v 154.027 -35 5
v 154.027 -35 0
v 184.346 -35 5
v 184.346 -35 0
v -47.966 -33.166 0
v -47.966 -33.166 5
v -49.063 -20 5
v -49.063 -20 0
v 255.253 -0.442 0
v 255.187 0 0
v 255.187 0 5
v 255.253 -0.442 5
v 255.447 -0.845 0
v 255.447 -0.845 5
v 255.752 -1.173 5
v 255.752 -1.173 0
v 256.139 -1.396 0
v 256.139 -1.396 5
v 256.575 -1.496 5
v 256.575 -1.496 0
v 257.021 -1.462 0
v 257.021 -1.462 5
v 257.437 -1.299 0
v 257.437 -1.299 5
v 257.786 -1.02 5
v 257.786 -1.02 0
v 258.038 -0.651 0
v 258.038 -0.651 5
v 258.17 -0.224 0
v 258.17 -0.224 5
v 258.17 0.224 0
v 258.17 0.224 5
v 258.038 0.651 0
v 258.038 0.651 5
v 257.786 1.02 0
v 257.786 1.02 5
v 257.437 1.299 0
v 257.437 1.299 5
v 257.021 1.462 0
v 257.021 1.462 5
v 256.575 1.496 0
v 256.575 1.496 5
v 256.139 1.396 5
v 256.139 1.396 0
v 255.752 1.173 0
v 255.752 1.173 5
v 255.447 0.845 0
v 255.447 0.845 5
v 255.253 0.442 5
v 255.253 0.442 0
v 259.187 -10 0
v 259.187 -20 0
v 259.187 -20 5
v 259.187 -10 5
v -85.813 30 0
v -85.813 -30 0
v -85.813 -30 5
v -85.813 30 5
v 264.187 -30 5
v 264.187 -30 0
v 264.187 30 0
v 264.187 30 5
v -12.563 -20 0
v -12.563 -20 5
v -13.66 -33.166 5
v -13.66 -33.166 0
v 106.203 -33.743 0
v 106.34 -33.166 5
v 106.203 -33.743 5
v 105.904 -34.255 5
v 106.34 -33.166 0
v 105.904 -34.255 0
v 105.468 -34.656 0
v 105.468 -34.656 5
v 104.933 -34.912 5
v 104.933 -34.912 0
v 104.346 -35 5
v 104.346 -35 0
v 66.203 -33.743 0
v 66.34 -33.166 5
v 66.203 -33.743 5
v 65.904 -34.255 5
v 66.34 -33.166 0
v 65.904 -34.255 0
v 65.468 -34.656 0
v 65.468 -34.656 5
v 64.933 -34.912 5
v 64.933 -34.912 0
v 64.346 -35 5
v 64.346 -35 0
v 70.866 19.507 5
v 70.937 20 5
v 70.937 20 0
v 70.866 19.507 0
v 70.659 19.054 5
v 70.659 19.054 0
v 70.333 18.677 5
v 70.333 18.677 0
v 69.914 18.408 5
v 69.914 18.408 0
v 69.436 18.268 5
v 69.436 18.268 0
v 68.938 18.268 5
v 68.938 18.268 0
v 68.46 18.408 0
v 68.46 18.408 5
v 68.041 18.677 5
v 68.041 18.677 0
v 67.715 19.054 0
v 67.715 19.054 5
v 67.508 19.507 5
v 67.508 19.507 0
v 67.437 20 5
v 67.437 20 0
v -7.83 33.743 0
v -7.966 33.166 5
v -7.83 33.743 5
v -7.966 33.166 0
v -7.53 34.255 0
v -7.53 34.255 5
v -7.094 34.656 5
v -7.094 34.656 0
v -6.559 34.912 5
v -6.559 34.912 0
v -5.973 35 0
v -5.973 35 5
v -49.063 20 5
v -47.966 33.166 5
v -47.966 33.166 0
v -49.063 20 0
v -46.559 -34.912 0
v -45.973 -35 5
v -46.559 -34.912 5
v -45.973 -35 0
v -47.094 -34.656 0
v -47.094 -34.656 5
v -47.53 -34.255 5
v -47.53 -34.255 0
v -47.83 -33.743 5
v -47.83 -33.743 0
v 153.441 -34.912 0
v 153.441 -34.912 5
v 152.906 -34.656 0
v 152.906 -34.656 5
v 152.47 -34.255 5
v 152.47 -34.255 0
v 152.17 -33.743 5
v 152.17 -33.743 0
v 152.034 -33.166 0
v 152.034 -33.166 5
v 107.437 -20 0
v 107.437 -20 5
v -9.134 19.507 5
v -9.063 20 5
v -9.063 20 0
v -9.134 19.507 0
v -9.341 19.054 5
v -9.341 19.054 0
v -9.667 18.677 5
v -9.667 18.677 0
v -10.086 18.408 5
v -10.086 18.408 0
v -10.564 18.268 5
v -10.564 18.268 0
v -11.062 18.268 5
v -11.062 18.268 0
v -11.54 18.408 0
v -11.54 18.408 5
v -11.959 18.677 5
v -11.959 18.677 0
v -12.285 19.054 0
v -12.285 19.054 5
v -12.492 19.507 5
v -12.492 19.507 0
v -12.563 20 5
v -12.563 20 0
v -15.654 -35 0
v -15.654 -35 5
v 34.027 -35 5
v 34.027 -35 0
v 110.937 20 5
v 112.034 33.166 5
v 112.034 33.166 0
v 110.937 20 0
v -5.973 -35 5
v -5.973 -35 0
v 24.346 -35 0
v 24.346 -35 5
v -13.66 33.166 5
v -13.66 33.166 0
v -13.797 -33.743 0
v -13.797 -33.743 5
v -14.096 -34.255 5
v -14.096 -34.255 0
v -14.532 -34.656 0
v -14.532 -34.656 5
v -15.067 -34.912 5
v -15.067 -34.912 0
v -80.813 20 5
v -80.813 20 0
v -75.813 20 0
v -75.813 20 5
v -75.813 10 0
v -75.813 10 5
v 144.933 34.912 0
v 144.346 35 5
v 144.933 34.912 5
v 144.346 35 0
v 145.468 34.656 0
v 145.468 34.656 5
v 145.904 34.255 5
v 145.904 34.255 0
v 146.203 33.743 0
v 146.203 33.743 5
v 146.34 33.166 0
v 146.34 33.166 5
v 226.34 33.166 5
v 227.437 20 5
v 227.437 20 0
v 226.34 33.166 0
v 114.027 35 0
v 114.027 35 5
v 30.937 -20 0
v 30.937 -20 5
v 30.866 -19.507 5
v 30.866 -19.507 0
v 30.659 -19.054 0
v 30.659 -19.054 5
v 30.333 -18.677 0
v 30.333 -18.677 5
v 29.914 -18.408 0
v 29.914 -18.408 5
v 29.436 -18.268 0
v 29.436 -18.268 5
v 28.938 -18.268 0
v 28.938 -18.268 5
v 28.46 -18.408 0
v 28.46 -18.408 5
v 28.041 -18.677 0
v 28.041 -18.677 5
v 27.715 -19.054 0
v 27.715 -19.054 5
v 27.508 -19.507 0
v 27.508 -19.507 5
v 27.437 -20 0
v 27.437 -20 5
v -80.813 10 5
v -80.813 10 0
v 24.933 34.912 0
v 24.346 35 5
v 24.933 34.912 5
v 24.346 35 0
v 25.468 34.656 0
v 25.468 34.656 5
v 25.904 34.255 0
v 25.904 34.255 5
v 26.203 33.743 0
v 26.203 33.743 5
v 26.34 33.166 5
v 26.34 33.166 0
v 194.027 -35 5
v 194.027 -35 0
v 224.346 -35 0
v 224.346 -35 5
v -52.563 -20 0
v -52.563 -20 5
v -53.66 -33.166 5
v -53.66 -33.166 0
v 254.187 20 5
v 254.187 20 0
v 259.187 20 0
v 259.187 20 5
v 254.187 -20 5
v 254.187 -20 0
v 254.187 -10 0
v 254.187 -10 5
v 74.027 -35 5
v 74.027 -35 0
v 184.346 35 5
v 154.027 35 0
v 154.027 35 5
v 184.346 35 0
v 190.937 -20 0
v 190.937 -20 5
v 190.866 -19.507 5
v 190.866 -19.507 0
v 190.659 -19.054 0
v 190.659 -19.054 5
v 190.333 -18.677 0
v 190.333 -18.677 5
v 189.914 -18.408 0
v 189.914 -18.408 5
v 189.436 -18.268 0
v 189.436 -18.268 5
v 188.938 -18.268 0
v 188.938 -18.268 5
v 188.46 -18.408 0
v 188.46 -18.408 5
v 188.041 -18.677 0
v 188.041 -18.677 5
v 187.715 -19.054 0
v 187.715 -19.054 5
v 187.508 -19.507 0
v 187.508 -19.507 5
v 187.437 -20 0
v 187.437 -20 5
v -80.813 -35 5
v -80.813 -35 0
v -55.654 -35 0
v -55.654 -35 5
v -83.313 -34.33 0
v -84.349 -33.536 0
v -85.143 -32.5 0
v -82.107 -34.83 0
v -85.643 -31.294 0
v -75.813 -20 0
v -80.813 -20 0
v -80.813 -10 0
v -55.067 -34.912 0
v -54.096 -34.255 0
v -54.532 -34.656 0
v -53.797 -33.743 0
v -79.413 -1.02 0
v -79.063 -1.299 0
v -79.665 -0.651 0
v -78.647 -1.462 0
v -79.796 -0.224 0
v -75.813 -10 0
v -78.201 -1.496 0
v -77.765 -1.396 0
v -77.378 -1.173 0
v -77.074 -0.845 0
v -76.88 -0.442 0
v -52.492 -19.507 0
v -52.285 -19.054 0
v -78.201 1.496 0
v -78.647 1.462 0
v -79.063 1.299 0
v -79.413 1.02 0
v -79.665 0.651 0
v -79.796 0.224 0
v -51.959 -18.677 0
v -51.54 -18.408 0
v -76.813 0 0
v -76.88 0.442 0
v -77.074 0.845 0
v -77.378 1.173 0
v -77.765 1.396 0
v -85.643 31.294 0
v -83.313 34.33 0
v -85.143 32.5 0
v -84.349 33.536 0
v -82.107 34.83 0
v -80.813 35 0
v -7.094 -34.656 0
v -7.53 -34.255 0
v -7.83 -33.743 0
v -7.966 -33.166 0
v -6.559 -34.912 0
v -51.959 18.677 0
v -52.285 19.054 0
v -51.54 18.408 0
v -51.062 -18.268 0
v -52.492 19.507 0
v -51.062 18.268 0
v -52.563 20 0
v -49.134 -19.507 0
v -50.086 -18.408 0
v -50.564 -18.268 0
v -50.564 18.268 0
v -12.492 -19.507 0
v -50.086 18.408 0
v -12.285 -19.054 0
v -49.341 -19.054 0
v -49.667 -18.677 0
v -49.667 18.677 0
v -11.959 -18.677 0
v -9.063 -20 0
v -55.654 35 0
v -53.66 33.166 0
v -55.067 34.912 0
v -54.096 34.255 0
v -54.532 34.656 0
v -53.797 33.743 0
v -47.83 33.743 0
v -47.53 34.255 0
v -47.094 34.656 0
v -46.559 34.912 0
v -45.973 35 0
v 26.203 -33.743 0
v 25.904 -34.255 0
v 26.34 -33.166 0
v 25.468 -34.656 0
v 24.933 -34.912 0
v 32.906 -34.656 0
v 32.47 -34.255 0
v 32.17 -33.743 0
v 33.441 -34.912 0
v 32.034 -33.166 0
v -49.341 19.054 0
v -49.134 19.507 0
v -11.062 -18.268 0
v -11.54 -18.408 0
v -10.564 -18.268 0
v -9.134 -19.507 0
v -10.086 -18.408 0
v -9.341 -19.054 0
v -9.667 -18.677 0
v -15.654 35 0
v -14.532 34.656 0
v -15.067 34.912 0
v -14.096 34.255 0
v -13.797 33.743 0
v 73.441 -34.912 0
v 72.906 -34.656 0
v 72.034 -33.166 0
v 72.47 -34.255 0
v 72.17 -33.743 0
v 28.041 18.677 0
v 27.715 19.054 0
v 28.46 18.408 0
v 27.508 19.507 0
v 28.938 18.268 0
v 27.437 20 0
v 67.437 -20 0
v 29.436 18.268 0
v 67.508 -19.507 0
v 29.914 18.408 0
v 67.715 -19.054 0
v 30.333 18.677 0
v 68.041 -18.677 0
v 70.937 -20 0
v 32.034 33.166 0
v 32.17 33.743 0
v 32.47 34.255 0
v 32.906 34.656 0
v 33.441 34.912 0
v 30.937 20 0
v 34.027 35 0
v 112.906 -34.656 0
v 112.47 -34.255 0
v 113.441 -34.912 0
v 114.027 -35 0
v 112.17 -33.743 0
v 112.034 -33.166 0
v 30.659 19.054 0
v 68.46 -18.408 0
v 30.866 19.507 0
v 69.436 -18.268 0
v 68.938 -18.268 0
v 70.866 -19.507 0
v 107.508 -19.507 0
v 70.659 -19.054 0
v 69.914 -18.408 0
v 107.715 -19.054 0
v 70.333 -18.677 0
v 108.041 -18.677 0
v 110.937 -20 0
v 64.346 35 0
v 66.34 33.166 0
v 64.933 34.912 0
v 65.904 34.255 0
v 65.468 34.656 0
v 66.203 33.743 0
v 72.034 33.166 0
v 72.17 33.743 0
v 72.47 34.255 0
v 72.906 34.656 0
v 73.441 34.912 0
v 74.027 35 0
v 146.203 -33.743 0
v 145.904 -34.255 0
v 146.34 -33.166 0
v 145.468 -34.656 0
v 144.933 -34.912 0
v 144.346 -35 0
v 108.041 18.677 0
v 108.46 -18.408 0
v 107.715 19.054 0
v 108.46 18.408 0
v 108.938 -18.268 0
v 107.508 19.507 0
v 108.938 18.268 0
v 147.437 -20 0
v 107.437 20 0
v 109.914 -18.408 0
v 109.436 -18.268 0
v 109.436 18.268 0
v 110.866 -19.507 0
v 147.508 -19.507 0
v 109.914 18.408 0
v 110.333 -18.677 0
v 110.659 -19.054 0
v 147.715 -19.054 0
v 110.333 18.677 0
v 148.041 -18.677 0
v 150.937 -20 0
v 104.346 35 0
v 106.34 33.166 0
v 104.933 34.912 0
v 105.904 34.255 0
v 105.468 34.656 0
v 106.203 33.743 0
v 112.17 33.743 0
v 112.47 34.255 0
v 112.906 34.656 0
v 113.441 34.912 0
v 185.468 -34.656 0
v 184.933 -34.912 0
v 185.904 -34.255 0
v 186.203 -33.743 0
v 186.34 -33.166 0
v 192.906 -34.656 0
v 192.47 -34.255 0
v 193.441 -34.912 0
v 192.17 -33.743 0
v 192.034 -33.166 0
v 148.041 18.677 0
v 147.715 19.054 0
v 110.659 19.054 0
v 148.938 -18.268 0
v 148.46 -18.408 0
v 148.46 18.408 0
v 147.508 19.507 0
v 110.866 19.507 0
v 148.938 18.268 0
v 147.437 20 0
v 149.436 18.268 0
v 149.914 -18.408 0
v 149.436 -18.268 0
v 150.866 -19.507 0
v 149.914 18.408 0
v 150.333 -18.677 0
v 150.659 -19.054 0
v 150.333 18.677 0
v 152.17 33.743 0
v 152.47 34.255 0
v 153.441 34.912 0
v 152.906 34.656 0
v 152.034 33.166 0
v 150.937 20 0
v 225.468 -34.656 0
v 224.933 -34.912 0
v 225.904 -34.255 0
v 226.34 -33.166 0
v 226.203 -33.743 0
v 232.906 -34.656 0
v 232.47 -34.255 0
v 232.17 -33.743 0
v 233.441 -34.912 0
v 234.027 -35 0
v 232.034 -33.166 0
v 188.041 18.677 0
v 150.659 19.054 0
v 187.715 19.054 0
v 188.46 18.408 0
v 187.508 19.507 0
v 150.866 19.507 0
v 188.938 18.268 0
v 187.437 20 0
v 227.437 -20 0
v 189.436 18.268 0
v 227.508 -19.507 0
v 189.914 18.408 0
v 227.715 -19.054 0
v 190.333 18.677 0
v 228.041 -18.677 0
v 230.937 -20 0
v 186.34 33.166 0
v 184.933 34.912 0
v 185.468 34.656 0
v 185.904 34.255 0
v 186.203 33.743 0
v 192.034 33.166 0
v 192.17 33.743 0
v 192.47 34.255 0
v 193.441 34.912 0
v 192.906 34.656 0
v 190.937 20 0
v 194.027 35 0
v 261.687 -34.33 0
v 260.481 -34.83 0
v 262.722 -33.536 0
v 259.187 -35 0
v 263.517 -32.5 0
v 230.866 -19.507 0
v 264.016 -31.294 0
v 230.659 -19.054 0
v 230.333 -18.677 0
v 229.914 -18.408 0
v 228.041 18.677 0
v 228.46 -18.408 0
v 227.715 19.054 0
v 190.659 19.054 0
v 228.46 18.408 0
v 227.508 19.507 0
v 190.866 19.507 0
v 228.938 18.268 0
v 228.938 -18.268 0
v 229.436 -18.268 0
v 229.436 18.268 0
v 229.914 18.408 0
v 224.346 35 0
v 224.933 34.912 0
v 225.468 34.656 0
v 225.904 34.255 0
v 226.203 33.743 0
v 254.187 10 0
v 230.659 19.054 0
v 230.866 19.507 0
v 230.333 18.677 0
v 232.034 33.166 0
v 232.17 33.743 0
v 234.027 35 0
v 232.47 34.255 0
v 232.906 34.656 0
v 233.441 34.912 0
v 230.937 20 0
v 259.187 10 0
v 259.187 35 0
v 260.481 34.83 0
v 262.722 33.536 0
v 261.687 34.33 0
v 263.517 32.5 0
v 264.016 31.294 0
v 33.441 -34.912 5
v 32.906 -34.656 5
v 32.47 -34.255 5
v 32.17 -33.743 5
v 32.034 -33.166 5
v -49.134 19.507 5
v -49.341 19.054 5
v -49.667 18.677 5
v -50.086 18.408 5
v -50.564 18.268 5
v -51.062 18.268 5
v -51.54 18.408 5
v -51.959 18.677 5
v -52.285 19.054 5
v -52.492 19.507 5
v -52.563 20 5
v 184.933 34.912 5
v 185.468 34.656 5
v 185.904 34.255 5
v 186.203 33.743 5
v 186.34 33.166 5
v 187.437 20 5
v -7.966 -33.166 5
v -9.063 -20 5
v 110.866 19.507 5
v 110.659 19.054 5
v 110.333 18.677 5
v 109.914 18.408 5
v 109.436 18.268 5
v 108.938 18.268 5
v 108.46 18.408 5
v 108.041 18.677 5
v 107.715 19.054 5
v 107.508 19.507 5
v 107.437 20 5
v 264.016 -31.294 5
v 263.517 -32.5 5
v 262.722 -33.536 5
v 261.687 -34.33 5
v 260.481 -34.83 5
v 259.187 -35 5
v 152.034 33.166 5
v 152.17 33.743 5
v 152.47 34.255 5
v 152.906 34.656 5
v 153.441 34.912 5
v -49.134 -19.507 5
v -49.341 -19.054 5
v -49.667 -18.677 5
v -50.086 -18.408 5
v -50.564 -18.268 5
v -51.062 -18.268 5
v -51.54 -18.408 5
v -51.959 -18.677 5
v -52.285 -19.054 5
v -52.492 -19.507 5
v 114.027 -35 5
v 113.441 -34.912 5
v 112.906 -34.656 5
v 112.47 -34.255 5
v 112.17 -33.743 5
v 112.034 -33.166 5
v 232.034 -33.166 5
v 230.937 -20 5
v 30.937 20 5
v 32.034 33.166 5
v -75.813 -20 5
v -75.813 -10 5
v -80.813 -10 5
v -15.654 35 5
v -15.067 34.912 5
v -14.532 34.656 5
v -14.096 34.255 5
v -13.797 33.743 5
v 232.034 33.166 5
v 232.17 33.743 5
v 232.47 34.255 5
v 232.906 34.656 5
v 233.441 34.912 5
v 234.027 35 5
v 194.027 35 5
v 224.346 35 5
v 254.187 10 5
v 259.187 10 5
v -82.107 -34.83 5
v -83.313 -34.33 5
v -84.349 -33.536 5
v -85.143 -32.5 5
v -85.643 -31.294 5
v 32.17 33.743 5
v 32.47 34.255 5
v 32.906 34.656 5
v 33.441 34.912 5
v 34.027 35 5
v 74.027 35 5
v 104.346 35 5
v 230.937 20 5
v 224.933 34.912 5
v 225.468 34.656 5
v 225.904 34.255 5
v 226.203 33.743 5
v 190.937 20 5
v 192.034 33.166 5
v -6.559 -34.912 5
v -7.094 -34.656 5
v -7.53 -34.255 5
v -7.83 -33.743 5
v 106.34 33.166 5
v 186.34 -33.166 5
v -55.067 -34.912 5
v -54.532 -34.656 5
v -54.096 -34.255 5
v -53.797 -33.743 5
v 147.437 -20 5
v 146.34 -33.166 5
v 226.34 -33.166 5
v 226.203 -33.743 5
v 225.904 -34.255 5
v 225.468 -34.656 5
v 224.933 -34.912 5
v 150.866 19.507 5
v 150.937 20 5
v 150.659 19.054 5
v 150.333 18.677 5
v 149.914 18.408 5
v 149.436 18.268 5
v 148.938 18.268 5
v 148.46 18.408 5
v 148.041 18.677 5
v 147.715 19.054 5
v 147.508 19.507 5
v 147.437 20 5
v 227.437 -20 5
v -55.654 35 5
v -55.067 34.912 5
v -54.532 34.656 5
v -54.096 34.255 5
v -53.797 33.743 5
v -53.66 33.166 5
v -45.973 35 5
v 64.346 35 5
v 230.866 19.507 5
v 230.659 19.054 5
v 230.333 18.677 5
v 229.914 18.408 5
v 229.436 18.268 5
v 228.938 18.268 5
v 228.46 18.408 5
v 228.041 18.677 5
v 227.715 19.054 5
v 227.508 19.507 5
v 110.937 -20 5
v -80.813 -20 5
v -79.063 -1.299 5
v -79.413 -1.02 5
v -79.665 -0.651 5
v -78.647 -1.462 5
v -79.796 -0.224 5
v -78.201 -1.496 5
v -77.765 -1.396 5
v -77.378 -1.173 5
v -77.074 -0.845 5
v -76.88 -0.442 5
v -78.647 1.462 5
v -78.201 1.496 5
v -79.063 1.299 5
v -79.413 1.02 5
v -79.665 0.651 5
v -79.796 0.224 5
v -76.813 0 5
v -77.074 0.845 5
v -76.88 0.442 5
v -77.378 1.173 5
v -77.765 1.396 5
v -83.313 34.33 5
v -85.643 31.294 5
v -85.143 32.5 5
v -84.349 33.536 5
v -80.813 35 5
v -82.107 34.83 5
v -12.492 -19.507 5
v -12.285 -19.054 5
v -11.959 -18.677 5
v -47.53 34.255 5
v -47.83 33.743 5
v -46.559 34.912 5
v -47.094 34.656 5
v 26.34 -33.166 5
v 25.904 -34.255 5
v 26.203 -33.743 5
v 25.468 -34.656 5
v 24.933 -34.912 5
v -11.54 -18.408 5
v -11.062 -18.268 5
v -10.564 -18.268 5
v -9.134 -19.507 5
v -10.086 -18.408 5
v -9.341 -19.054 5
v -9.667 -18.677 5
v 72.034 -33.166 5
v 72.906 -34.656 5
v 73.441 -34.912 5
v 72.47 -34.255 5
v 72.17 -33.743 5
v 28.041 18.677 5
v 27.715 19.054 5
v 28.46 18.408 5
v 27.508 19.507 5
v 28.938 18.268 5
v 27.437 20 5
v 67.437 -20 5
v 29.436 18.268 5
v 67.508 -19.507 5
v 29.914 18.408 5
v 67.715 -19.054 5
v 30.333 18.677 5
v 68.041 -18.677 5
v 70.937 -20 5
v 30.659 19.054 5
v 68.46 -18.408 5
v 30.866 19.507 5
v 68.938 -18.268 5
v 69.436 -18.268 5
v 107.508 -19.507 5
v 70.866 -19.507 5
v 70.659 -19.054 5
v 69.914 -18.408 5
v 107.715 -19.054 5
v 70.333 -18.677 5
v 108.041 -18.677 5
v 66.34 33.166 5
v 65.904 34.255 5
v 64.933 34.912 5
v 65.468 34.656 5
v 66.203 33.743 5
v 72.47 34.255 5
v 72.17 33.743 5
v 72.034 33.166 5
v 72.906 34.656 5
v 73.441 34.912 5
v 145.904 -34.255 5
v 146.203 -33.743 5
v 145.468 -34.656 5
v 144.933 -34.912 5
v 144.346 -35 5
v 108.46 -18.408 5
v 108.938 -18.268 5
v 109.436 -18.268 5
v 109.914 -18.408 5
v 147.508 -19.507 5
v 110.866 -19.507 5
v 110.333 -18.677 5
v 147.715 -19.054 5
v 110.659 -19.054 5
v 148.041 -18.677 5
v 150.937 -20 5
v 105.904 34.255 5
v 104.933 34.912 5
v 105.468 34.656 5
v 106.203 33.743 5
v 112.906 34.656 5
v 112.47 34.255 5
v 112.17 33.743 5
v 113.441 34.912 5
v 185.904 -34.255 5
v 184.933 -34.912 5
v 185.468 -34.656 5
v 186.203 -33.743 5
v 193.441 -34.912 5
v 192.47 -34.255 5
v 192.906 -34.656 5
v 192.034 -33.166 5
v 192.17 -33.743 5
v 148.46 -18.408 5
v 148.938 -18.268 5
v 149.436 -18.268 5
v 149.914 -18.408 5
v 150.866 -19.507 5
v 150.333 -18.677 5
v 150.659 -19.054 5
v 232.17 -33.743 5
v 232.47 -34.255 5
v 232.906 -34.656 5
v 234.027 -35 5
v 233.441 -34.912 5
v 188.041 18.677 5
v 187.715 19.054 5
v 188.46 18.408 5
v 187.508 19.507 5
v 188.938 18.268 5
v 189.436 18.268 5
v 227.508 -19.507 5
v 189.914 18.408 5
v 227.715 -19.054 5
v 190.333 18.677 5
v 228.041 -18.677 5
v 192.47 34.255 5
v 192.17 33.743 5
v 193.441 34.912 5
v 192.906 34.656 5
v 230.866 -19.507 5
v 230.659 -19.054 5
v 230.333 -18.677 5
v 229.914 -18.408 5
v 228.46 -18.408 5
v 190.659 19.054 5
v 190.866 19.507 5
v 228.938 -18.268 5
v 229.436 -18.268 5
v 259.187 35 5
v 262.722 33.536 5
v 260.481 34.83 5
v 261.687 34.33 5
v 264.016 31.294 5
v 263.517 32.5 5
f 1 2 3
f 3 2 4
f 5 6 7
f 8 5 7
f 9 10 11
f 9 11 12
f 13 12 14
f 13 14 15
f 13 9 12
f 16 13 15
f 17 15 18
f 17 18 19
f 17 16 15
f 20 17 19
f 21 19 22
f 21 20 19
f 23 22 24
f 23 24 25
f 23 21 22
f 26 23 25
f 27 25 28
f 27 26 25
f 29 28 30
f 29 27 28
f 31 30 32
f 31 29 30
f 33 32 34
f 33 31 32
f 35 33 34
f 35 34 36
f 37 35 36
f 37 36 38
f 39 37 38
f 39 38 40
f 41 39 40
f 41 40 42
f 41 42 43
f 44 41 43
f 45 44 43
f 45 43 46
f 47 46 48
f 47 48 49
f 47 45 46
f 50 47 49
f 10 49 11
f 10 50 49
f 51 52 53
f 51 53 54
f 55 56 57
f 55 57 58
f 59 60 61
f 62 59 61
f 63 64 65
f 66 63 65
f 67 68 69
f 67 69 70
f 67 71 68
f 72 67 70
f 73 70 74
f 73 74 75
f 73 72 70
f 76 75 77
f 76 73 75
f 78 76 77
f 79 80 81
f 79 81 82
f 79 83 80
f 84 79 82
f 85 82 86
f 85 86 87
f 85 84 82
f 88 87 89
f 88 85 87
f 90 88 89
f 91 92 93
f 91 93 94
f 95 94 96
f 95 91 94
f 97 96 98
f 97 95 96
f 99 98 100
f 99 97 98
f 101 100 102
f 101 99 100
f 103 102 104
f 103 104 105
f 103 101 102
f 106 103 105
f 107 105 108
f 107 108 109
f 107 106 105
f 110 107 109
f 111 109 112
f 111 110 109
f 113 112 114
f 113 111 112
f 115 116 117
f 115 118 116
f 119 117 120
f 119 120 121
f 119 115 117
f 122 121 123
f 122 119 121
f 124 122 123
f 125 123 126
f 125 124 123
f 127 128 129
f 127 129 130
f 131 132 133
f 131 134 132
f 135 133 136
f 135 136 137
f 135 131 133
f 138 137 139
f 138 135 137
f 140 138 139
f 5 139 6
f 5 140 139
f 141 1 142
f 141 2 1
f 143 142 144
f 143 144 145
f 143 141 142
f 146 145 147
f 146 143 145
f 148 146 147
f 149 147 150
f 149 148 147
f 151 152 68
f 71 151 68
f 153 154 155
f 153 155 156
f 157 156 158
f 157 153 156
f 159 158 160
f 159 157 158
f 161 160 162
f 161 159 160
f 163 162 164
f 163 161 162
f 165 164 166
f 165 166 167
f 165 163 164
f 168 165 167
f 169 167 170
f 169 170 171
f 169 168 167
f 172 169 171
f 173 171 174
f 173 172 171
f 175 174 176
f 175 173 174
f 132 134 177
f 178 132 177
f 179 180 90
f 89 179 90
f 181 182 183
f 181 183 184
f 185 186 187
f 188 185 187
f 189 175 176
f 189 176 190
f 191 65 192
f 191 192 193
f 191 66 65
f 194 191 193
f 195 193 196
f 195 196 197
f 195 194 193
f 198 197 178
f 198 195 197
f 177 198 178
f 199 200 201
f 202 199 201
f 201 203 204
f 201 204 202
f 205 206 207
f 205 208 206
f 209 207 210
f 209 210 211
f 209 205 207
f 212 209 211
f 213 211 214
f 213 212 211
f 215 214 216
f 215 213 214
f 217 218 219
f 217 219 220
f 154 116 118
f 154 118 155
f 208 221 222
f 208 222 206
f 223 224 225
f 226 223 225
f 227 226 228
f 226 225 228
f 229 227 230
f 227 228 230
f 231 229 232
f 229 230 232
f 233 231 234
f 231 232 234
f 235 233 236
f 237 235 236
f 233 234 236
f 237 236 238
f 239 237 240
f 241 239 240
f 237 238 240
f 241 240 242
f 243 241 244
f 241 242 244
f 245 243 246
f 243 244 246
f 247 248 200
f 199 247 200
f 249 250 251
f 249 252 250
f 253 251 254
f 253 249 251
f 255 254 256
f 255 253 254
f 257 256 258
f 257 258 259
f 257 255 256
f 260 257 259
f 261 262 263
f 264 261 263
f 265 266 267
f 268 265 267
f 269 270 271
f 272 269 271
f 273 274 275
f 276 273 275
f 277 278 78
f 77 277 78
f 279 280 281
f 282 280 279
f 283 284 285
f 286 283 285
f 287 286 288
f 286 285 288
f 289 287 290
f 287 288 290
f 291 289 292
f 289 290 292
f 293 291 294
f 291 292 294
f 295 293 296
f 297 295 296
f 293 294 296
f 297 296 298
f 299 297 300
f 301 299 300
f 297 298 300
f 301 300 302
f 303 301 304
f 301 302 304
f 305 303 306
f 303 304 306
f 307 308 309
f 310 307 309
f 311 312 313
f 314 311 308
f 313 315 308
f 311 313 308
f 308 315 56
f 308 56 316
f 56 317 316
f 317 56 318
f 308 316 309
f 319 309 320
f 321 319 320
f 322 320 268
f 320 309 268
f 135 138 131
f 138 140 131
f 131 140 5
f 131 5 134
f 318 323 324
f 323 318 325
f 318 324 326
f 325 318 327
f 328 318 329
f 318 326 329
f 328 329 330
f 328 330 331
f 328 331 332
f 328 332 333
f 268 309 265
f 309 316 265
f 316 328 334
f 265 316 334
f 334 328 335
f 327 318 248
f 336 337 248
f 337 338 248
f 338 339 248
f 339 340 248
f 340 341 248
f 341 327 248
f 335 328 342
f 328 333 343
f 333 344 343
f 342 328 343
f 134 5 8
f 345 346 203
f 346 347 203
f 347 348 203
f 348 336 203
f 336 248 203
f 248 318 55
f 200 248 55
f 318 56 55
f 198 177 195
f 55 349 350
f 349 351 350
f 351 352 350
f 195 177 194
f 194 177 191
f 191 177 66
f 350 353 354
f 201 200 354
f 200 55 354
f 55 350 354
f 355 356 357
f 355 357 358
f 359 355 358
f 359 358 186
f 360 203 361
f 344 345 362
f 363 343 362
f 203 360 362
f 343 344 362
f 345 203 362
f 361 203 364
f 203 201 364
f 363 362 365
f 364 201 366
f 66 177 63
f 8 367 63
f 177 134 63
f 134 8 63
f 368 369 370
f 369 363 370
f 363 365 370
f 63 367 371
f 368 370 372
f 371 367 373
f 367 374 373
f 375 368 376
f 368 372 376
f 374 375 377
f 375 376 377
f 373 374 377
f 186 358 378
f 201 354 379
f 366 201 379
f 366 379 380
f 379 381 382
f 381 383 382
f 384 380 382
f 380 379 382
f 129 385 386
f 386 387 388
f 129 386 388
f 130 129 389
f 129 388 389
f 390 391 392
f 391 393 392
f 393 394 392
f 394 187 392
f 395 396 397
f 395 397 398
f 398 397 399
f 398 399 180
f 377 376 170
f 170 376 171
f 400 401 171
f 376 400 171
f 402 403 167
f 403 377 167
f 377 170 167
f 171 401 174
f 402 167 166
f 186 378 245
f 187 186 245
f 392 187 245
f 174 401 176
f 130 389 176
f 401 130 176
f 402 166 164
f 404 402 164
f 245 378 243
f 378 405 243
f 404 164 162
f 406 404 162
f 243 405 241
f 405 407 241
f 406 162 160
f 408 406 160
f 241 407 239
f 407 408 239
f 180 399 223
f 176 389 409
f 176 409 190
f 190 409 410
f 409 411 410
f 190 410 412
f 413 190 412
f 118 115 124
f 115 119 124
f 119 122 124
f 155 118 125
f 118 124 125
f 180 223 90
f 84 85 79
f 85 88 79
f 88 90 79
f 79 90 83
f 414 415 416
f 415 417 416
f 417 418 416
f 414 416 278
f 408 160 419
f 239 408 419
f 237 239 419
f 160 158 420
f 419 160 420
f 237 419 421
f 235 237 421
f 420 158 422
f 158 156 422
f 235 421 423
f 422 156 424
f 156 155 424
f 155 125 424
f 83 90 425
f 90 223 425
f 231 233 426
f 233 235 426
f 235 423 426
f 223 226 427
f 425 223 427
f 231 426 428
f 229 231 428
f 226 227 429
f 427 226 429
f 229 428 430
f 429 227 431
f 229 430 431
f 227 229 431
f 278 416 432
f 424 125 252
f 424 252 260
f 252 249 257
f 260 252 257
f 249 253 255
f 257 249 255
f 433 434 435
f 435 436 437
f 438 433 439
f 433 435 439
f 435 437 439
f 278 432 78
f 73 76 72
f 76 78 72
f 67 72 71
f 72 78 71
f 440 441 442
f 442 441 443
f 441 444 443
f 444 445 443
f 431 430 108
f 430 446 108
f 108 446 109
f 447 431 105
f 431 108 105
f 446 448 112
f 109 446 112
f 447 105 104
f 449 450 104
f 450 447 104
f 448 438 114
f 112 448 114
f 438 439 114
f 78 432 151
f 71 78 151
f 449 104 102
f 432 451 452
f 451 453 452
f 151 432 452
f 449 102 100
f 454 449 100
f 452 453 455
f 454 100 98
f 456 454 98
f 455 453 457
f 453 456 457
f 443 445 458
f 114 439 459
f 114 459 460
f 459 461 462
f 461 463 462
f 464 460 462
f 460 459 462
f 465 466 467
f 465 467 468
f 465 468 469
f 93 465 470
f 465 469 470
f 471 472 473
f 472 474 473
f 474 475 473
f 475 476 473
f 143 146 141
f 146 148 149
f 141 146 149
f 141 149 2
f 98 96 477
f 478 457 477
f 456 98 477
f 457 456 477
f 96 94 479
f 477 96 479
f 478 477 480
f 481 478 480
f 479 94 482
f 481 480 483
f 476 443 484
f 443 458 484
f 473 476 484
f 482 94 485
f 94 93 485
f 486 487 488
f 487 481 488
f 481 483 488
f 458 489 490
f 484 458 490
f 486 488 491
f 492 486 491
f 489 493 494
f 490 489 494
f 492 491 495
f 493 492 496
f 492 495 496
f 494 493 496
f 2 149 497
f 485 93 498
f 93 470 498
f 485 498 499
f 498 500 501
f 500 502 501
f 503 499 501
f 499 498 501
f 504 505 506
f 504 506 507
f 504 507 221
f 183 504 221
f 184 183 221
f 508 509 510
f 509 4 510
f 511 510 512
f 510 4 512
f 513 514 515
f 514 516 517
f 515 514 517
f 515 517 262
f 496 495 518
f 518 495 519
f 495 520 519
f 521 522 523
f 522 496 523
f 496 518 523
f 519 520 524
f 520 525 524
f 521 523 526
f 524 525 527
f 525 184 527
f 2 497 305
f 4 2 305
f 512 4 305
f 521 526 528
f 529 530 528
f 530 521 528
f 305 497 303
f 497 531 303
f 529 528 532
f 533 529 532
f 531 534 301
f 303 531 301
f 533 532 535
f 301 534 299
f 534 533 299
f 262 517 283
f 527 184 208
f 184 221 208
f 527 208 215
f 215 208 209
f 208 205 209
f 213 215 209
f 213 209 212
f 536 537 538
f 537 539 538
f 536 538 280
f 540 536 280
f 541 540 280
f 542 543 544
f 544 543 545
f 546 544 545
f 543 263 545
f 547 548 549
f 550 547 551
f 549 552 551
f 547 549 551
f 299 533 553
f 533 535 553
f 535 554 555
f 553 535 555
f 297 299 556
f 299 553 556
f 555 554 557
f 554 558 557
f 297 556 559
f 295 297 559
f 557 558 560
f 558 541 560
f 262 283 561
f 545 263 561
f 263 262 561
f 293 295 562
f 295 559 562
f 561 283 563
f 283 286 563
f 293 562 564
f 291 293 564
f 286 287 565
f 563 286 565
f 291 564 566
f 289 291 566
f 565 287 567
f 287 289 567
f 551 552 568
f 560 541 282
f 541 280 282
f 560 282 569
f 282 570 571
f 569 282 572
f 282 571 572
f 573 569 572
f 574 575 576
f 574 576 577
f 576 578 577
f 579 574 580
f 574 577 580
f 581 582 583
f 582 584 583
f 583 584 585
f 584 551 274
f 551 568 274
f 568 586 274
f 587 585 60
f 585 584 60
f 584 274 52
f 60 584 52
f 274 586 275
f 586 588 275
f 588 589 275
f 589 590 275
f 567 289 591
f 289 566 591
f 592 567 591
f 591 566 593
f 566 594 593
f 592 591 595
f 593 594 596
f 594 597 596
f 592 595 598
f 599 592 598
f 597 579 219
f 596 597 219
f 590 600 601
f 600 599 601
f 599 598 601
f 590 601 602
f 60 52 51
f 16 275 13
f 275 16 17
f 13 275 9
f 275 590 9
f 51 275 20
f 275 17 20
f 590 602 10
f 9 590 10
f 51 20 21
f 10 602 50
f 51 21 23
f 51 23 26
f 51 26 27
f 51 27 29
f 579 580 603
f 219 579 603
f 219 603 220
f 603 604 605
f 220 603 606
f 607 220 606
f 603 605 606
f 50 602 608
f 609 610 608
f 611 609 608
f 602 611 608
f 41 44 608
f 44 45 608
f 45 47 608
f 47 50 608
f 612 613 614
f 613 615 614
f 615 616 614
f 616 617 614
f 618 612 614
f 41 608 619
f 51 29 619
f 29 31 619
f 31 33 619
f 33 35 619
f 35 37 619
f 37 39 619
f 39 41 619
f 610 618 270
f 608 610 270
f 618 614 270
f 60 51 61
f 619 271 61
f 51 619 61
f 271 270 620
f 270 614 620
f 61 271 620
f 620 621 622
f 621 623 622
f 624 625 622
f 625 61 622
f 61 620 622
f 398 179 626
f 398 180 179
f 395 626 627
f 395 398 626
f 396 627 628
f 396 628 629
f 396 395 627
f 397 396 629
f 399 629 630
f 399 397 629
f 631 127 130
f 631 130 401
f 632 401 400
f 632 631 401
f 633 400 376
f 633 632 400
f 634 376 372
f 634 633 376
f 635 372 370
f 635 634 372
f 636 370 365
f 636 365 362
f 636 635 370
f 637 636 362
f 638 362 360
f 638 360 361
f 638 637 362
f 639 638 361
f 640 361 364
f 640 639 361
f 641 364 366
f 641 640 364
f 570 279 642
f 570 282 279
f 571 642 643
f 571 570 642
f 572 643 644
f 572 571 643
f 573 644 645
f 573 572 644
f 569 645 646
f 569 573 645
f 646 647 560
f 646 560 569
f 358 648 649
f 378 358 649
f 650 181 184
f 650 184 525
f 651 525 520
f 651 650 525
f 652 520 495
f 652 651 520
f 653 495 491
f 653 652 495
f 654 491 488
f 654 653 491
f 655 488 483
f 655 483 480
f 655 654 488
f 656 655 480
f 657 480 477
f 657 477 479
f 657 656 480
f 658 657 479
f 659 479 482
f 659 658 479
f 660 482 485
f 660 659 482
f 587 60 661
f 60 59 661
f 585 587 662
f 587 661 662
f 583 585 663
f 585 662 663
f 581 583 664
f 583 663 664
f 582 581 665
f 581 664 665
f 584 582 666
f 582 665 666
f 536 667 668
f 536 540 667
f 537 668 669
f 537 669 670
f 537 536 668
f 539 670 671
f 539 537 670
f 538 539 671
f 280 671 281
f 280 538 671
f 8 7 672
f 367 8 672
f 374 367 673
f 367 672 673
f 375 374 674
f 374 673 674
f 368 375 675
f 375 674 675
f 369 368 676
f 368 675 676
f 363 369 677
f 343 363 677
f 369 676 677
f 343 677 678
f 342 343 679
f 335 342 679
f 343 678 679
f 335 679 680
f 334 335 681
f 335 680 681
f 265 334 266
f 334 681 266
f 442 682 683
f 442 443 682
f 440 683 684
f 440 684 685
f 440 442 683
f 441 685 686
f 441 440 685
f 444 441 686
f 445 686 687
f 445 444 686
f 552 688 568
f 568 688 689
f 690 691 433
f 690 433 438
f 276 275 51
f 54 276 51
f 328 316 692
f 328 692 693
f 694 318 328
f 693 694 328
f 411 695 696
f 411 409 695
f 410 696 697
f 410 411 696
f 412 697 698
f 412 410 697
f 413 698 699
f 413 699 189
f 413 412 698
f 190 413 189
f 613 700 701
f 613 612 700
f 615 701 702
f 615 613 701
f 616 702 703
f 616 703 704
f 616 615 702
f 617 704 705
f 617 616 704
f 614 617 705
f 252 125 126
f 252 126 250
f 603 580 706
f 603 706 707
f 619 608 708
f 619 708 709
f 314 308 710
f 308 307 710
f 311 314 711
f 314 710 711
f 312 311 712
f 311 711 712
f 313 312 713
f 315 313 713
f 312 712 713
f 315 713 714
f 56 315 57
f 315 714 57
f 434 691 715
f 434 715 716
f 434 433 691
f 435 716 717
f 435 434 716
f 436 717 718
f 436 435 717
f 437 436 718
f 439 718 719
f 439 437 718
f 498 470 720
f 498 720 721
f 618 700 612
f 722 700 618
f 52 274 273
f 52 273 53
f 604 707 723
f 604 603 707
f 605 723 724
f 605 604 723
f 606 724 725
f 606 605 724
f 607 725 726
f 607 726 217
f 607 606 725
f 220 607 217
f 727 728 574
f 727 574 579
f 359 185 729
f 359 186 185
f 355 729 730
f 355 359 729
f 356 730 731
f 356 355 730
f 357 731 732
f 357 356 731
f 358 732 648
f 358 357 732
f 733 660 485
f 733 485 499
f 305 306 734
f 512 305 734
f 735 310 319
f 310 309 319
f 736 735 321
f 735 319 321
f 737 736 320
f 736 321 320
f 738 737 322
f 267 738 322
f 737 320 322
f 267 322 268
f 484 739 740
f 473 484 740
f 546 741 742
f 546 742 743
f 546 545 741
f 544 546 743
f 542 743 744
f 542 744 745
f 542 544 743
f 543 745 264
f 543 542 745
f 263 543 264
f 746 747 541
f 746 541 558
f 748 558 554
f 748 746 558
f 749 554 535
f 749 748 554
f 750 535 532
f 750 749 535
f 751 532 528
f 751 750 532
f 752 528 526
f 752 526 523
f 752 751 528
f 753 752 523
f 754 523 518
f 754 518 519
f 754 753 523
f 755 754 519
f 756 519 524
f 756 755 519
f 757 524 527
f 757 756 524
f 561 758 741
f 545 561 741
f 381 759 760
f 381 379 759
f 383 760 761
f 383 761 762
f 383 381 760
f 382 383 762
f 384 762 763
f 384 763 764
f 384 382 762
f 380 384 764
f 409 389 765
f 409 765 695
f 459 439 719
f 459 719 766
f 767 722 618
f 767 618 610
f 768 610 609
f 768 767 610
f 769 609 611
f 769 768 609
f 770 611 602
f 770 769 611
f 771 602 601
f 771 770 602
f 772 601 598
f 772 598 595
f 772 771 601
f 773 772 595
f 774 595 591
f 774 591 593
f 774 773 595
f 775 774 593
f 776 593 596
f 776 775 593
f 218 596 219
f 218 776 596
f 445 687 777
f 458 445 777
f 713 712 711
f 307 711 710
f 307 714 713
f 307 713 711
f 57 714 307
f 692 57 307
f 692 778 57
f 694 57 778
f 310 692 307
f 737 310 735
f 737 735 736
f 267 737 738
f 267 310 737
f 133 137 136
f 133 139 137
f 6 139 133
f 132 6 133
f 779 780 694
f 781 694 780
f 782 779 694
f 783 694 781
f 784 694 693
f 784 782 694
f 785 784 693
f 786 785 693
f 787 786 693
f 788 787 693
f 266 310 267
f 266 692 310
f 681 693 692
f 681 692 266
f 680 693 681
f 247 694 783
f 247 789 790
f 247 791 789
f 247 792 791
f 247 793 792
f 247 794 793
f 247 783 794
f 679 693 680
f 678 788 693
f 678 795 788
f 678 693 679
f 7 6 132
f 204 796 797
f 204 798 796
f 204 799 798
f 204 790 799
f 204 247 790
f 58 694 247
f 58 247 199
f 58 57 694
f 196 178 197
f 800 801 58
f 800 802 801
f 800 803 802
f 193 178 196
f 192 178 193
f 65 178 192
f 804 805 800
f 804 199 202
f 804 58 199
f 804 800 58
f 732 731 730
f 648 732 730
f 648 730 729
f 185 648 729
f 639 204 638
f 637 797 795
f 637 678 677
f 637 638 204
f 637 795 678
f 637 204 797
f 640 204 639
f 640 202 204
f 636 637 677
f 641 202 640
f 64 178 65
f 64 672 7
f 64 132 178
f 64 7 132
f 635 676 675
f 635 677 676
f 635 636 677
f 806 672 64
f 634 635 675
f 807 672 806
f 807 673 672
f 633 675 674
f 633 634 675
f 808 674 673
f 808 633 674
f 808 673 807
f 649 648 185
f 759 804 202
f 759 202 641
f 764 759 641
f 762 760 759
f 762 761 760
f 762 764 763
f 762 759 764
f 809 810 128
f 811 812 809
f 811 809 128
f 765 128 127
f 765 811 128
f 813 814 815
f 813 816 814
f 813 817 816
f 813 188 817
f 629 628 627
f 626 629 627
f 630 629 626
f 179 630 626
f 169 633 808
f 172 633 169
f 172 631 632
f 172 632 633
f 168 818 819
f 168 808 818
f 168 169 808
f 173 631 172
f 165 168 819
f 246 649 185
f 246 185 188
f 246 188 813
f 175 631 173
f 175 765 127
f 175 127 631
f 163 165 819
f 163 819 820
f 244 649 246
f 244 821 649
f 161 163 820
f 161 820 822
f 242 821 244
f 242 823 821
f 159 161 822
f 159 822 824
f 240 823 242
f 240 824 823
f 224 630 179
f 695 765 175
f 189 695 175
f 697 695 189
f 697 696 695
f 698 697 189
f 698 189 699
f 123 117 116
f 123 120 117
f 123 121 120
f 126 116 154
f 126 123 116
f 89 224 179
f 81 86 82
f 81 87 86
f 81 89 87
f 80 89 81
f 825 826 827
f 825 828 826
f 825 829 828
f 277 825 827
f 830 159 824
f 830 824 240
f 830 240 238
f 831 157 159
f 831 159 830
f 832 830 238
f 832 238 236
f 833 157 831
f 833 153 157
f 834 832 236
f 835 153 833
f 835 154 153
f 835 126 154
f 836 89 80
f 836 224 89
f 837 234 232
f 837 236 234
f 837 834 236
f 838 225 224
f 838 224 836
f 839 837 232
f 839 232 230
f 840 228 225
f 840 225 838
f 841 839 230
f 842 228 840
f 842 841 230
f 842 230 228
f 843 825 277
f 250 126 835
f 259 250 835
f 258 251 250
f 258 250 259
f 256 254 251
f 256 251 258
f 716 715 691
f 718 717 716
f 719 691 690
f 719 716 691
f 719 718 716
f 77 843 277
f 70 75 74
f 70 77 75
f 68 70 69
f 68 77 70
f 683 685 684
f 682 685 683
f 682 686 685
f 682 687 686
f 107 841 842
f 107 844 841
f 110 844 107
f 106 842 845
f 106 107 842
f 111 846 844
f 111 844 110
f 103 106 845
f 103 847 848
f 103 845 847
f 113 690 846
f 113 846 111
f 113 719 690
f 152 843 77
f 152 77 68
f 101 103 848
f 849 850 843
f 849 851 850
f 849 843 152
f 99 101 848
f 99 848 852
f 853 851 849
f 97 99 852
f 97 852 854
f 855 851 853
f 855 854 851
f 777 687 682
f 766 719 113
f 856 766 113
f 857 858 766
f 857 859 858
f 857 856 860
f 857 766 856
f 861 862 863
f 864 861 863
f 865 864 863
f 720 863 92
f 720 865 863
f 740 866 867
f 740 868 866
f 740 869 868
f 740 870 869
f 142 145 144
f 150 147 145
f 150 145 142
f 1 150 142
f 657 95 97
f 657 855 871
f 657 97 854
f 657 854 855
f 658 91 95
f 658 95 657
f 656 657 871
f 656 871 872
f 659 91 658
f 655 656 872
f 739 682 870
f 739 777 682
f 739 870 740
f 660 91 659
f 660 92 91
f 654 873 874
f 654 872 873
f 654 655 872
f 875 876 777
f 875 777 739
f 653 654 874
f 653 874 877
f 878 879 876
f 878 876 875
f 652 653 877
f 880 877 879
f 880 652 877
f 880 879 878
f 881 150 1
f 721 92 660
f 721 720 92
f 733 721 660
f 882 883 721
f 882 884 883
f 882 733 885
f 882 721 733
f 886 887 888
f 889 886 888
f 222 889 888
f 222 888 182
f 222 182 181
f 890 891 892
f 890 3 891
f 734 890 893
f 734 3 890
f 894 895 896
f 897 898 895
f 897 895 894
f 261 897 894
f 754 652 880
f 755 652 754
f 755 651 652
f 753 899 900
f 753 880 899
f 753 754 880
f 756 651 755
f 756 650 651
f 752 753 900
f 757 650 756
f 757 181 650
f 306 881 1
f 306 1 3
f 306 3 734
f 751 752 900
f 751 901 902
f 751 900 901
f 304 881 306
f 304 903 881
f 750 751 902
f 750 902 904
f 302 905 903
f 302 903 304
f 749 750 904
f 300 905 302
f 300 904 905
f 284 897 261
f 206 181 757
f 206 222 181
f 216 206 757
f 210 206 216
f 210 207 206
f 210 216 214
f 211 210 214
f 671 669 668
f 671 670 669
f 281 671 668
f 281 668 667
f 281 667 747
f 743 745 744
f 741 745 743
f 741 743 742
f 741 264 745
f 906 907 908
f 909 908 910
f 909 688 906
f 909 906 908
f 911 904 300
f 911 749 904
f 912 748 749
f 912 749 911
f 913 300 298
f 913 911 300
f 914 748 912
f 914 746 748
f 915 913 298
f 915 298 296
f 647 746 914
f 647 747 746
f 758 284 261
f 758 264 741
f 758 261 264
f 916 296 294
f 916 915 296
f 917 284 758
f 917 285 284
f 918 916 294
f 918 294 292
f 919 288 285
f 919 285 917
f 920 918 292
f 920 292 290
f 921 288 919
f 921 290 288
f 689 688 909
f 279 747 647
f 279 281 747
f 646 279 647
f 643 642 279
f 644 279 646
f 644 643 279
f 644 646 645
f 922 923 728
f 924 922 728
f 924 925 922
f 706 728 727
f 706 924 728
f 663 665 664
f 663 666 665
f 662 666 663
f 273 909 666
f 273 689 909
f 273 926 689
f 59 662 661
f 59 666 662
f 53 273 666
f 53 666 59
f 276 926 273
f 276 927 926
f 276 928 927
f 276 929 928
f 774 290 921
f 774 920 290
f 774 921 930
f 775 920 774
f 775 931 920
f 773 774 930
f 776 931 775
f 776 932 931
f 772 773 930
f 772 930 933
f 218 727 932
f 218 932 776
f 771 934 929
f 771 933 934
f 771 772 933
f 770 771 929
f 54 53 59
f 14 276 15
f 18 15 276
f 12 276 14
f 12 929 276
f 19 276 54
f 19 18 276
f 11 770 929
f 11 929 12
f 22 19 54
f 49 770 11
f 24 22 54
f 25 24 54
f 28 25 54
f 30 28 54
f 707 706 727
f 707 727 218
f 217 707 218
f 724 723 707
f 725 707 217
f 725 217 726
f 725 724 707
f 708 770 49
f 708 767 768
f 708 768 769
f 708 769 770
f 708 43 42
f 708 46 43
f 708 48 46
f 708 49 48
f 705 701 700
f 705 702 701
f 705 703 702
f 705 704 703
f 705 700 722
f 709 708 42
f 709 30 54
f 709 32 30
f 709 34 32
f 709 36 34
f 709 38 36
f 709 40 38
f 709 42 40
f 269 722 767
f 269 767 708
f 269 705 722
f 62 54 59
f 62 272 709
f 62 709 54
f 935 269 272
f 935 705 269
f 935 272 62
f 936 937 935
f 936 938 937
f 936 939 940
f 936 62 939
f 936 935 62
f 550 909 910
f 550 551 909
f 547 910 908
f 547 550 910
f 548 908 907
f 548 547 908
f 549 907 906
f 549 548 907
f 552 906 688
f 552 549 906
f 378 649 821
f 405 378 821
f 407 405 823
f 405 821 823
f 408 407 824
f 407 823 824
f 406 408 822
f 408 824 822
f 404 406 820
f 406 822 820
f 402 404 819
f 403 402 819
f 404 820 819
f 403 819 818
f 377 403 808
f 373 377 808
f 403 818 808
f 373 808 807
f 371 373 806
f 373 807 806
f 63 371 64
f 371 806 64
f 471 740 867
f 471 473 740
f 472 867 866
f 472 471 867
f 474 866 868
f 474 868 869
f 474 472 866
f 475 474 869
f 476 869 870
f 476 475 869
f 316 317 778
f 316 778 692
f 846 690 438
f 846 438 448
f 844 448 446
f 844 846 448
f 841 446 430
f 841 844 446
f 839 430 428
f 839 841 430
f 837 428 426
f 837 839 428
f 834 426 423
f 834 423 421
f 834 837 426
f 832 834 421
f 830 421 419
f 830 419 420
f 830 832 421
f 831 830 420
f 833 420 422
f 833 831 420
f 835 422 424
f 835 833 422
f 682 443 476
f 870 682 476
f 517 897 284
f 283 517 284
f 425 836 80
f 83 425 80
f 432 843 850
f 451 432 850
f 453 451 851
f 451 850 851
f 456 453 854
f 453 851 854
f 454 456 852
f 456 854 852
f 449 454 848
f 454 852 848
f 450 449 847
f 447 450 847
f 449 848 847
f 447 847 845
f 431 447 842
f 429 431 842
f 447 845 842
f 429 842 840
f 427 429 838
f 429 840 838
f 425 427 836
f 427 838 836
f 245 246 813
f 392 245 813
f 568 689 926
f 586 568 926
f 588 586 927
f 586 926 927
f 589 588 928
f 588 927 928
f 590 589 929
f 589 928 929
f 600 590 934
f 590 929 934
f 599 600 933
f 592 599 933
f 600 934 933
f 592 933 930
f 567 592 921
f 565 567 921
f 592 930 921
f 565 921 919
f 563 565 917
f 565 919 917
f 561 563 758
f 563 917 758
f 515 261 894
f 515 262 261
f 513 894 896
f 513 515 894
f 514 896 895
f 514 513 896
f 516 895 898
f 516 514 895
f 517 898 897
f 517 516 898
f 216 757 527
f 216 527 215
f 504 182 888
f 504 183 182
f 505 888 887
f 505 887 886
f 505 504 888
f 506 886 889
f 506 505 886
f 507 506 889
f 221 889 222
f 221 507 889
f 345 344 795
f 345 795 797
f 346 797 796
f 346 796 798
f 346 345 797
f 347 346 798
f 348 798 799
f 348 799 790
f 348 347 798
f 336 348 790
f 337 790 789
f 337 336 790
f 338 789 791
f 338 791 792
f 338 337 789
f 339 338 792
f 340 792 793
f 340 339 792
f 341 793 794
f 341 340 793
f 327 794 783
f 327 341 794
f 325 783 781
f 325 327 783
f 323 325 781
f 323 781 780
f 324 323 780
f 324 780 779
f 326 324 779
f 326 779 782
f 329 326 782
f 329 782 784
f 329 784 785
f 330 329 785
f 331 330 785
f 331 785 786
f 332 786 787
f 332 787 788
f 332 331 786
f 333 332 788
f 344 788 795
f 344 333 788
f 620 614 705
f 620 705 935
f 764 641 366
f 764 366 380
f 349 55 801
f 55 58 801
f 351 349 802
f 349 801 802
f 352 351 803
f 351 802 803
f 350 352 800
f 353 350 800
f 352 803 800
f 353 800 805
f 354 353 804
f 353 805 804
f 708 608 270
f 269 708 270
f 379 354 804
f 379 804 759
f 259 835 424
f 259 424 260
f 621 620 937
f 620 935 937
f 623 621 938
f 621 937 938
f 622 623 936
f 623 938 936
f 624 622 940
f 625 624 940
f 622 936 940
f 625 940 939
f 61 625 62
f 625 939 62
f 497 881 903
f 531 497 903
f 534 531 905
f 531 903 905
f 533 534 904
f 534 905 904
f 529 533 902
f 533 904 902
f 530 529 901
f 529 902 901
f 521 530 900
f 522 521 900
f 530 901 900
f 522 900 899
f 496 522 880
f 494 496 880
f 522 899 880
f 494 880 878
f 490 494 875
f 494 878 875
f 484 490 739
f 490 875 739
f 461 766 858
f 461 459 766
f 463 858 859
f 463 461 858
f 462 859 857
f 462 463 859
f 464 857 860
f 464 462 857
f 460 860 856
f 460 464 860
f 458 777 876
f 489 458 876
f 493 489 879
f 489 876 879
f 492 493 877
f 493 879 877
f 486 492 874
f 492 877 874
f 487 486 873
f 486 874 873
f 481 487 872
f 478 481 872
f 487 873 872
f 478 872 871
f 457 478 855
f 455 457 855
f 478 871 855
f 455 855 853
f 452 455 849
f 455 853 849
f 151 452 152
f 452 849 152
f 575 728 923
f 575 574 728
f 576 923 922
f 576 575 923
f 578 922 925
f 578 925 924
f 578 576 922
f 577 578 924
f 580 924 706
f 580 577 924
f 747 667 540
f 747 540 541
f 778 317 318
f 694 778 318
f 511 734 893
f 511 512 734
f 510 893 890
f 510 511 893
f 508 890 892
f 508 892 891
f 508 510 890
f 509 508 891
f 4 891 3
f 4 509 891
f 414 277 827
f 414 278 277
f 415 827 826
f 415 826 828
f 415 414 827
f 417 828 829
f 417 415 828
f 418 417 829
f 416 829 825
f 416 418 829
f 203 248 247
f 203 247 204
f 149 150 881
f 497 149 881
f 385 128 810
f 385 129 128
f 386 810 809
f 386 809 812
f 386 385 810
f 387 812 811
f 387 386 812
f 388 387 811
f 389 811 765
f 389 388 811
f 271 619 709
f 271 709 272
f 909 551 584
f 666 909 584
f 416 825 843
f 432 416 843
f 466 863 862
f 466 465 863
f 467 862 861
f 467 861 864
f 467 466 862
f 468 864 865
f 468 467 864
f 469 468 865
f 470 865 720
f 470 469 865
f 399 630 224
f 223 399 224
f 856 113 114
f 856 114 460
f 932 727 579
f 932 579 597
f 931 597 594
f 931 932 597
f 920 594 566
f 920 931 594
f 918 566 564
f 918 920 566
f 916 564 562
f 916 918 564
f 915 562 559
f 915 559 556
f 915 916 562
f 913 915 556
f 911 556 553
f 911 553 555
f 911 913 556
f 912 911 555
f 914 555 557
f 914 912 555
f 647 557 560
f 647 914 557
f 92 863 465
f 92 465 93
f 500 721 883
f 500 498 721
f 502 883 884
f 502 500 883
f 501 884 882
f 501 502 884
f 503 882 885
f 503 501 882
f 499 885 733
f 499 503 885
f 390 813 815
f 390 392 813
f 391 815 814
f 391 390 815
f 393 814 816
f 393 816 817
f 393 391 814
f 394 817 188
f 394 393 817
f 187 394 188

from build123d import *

# Parameters (mm, degrees)
SKETCH1_W           = 350
SKETCH1_H           = 70
SKETCH1_R           = 1.5
SKETCH1_W_2         = 5
SKETCH1_H_2         = 10
BOSS_EXTRUDE1_DEPTH = 5
CUT_EXTRUDE1_DEPTH  = 5
FILLET1_R           = 2
CONG_1_R            = 5


with BuildPart() as part:
    # Sketch1 → Boss-Extrude1 (new body)
    with BuildSketch(Plane.XY):
        with Locations((89.186746988, 0)):
            Rectangle(SKETCH1_W, SKETCH1_H)
        with Locations((-78.313253012, 0)):
            Circle(SKETCH1_R, mode=Mode.SUBTRACT)
        with Locations(Location((256.686746988, 0, 0), (0, 0, 180))):
            Circle(SKETCH1_R, mode=Mode.SUBTRACT)
        with Locations((-78.313253012, -15)):
            Rectangle(SKETCH1_W_2, SKETCH1_H_2, mode=Mode.SUBTRACT)
        with Locations((-78.313253012, 15)):
            Rectangle(SKETCH1_W_2, SKETCH1_H_2, mode=Mode.SUBTRACT)
        with Locations((256.686746988, -15)):
            Rectangle(SKETCH1_W_2, SKETCH1_H_2, mode=Mode.SUBTRACT)
        with Locations((256.686746988, 15)):
            Rectangle(SKETCH1_W_2, SKETCH1_H_2, mode=Mode.SUBTRACT)
    extrude(amount=BOSS_EXTRUDE1_DEPTH)

    # Sketch2 → Cut-Extrude1 (cut)
    with BuildSketch(Plane.XY.offset(5)):
        with BuildLine():
            Line((-53.813253012, 35), (-47.813253012, 35))
            Line((-47.813253012, 35), (-49.063253012, 20))
            ThreePointArc((-49.063253012, 20), (-50.813253012, 18.25), (-52.563253012, 20))
            Line((-52.563253012, 20), (-53.813253012, 35))
        make_face()
        with BuildLine():
            Line((-13.813253012, 35), (-7.813253012, 35))
            Line((-7.813253012, 35), (-9.063253012, 20))
            ThreePointArc((-9.063253012, 20), (-10.813253012, 18.25), (-12.563253012, 20))
            Line((-12.563253012, 20), (-13.813253012, 35))
        make_face()
        with BuildLine():
            Line((26.186746988, 35), (32.186746988, 35))
            Line((32.186746988, 35), (30.936746988, 20))
            ThreePointArc((30.936746988, 20), (29.186746988, 18.25), (27.436746988, 20))
            Line((27.436746988, 20), (26.186746988, 35))
        make_face()
        with BuildLine():
            Line((66.186746988, 35), (72.186746988, 35))
            Line((72.186746988, 35), (70.936746988, 20))
            ThreePointArc((70.936746988, 20), (69.186746988, 18.25), (67.436746988, 20))
            Line((67.436746988, 20), (66.186746988, 35))
        make_face()
        with BuildLine():
            Line((106.186746988, 35), (112.186746988, 35))
            Line((112.186746988, 35), (110.936746988, 20))
            ThreePointArc((110.936746988, 20), (109.186746988, 18.25), (107.436746988, 20))
            Line((107.436746988, 20), (106.186746988, 35))
        make_face()
        with BuildLine():
            Line((146.186746988, 35), (152.186746988, 35))
            Line((152.186746988, 35), (150.936746988, 20))
            ThreePointArc((150.936746988, 20), (149.186746988, 18.25), (147.436746988, 20))
            Line((147.436746988, 20), (146.186746988, 35))
        make_face()
        with BuildLine():
            Line((186.186746988, 35), (192.186746988, 35))
            Line((192.186746988, 35), (190.936746988, 20))
            ThreePointArc((190.936746988, 20), (189.186746988, 18.25), (187.436746988, 20))
            Line((187.436746988, 20), (186.186746988, 35))
        make_face()
        with BuildLine():
            Line((226.186746988, 35), (232.186746988, 35))
            Line((232.186746988, 35), (230.936746988, 20))
            ThreePointArc((230.936746988, 20), (229.186746988, 18.25), (227.436746988, 20))
            Line((227.436746988, 20), (226.186746988, 35))
        make_face()
        with BuildLine():
            Line((232.186746988, -35), (230.936746988, -20))
            ThreePointArc((230.936746988, -20), (229.186746988, -18.25), (227.436746988, -20))
            Line((227.436746988, -20), (226.186746988, -35))
            Line((226.186746988, -35), (232.186746988, -35))
        make_face()
        with BuildLine():
            Line((192.186746988, -35), (190.936746988, -20))
            ThreePointArc((190.936746988, -20), (189.186746988, -18.25), (187.436746988, -20))
            Line((187.436746988, -20), (186.186746988, -35))
            Line((186.186746988, -35), (192.186746988, -35))
        make_face()
        with BuildLine():
            Line((152.186746988, -35), (150.936746988, -20))
            ThreePointArc((150.936746988, -20), (149.186746988, -18.25), (147.436746988, -20))
            Line((147.436746988, -20), (146.186746988, -35))
            Line((146.186746988, -35), (152.186746988, -35))
        make_face()
        with BuildLine():
            Line((112.186746988, -35), (110.936746988, -20))
            ThreePointArc((110.936746988, -20), (109.186746988, -18.25), (107.436746988, -20))
            Line((107.436746988, -20), (106.186746988, -35))
            Line((106.186746988, -35), (112.186746988, -35))
        make_face()
        with BuildLine():
            Line((72.186746988, -35), (70.936746988, -20))
            ThreePointArc((70.936746988, -20), (69.186746988, -18.25), (67.436746988, -20))
            Line((67.436746988, -20), (66.186746988, -35))
            Line((66.186746988, -35), (72.186746988, -35))
        make_face()
        with BuildLine():
            Line((32.186746988, -35), (30.936746988, -20))
            ThreePointArc((30.936746988, -20), (29.186746988, -18.25), (27.436746988, -20))
            Line((27.436746988, -20), (26.186746988, -35))
            Line((26.186746988, -35), (32.186746988, -35))
        make_face()
        with BuildLine():
            Line((-7.813253012, -35), (-9.063253012, -20))
            ThreePointArc((-9.063253012, -20), (-10.813253012, -18.25), (-12.563253012, -20))
            Line((-12.563253012, -20), (-13.813253012, -35))
            Line((-13.813253012, -35), (-7.813253012, -35))
        make_face()
        with BuildLine():
            Line((-47.813253012, -35), (-49.063253012, -20))
            ThreePointArc((-49.063253012, -20), (-50.813253012, -18.25), (-52.563253012, -20))
            Line((-52.563253012, -20), (-53.813253012, -35))
            Line((-53.813253012, -35), (-47.813253012, -35))
        make_face()
    extrude(amount=-CUT_EXTRUDE1_DEPTH, mode=Mode.SUBTRACT)

    # Fillet1
    fillet1_edges = [part.edges().sort_by_distance(p)[0] for p in [
        (-13.813253012, 35, 2.5),
        (-7.813253012, 35, 2.5),
        (26.186746988, 35, 2.5),
        (32.186746988, 35, 2.5),
        (66.186746988, 35, 2.5),
        (72.186746988, 35, 2.5),
        (106.186746988, 35, 2.5),
        (112.186746988, 35, 2.5),
        (146.186746988, 35, 2.5),
        (152.186746988, 35, 2.5),
        (186.186746988, 35, 2.5),
        (192.186746988, 35, 2.5),
        (226.186746988, 35, 2.5),
        (232.186746988, 35, 2.5),
        (232.186746988, -35, 2.5),
        (226.186746988, -35, 2.5),
        (192.186746988, -35, 2.5),
        (186.186746988, -35, 2.5),
        (152.186746988, -35, 2.5),
        (146.186746988, -35, 2.5),
        (112.186746988, -35, 2.5),
        (106.186746988, -35, 2.5),
        (72.186746988, -35, 2.5),
        (66.186746988, -35, 2.5),
        (32.186746988, -35, 2.5),
        (26.186746988, -35, 2.5),
        (-7.813253012, -35, 2.5),
        (-13.813253012, -35, 2.5),
        (-47.813253012, -35, 2.5),
        (-53.813253012, -35, 2.5),
        (-53.813253012, 35, 2.5),
        (-47.813253012, 35, 2.5),
    ]]
    fillet(fillet1_edges, radius=FILLET1_R)

    # Congé1
    cong_1_edges = [part.edges().sort_by_distance(p)[0] for p in [
        (-85.813253012, 35, 2.5),
        (264.186746988, 35, 2.5),
        (264.186746988, -35, 2.5),
        (-85.813253012, -35, 2.5),
    ]]
    fillet(cong_1_edges, radius=CONG_1_R)


solid = part.part
